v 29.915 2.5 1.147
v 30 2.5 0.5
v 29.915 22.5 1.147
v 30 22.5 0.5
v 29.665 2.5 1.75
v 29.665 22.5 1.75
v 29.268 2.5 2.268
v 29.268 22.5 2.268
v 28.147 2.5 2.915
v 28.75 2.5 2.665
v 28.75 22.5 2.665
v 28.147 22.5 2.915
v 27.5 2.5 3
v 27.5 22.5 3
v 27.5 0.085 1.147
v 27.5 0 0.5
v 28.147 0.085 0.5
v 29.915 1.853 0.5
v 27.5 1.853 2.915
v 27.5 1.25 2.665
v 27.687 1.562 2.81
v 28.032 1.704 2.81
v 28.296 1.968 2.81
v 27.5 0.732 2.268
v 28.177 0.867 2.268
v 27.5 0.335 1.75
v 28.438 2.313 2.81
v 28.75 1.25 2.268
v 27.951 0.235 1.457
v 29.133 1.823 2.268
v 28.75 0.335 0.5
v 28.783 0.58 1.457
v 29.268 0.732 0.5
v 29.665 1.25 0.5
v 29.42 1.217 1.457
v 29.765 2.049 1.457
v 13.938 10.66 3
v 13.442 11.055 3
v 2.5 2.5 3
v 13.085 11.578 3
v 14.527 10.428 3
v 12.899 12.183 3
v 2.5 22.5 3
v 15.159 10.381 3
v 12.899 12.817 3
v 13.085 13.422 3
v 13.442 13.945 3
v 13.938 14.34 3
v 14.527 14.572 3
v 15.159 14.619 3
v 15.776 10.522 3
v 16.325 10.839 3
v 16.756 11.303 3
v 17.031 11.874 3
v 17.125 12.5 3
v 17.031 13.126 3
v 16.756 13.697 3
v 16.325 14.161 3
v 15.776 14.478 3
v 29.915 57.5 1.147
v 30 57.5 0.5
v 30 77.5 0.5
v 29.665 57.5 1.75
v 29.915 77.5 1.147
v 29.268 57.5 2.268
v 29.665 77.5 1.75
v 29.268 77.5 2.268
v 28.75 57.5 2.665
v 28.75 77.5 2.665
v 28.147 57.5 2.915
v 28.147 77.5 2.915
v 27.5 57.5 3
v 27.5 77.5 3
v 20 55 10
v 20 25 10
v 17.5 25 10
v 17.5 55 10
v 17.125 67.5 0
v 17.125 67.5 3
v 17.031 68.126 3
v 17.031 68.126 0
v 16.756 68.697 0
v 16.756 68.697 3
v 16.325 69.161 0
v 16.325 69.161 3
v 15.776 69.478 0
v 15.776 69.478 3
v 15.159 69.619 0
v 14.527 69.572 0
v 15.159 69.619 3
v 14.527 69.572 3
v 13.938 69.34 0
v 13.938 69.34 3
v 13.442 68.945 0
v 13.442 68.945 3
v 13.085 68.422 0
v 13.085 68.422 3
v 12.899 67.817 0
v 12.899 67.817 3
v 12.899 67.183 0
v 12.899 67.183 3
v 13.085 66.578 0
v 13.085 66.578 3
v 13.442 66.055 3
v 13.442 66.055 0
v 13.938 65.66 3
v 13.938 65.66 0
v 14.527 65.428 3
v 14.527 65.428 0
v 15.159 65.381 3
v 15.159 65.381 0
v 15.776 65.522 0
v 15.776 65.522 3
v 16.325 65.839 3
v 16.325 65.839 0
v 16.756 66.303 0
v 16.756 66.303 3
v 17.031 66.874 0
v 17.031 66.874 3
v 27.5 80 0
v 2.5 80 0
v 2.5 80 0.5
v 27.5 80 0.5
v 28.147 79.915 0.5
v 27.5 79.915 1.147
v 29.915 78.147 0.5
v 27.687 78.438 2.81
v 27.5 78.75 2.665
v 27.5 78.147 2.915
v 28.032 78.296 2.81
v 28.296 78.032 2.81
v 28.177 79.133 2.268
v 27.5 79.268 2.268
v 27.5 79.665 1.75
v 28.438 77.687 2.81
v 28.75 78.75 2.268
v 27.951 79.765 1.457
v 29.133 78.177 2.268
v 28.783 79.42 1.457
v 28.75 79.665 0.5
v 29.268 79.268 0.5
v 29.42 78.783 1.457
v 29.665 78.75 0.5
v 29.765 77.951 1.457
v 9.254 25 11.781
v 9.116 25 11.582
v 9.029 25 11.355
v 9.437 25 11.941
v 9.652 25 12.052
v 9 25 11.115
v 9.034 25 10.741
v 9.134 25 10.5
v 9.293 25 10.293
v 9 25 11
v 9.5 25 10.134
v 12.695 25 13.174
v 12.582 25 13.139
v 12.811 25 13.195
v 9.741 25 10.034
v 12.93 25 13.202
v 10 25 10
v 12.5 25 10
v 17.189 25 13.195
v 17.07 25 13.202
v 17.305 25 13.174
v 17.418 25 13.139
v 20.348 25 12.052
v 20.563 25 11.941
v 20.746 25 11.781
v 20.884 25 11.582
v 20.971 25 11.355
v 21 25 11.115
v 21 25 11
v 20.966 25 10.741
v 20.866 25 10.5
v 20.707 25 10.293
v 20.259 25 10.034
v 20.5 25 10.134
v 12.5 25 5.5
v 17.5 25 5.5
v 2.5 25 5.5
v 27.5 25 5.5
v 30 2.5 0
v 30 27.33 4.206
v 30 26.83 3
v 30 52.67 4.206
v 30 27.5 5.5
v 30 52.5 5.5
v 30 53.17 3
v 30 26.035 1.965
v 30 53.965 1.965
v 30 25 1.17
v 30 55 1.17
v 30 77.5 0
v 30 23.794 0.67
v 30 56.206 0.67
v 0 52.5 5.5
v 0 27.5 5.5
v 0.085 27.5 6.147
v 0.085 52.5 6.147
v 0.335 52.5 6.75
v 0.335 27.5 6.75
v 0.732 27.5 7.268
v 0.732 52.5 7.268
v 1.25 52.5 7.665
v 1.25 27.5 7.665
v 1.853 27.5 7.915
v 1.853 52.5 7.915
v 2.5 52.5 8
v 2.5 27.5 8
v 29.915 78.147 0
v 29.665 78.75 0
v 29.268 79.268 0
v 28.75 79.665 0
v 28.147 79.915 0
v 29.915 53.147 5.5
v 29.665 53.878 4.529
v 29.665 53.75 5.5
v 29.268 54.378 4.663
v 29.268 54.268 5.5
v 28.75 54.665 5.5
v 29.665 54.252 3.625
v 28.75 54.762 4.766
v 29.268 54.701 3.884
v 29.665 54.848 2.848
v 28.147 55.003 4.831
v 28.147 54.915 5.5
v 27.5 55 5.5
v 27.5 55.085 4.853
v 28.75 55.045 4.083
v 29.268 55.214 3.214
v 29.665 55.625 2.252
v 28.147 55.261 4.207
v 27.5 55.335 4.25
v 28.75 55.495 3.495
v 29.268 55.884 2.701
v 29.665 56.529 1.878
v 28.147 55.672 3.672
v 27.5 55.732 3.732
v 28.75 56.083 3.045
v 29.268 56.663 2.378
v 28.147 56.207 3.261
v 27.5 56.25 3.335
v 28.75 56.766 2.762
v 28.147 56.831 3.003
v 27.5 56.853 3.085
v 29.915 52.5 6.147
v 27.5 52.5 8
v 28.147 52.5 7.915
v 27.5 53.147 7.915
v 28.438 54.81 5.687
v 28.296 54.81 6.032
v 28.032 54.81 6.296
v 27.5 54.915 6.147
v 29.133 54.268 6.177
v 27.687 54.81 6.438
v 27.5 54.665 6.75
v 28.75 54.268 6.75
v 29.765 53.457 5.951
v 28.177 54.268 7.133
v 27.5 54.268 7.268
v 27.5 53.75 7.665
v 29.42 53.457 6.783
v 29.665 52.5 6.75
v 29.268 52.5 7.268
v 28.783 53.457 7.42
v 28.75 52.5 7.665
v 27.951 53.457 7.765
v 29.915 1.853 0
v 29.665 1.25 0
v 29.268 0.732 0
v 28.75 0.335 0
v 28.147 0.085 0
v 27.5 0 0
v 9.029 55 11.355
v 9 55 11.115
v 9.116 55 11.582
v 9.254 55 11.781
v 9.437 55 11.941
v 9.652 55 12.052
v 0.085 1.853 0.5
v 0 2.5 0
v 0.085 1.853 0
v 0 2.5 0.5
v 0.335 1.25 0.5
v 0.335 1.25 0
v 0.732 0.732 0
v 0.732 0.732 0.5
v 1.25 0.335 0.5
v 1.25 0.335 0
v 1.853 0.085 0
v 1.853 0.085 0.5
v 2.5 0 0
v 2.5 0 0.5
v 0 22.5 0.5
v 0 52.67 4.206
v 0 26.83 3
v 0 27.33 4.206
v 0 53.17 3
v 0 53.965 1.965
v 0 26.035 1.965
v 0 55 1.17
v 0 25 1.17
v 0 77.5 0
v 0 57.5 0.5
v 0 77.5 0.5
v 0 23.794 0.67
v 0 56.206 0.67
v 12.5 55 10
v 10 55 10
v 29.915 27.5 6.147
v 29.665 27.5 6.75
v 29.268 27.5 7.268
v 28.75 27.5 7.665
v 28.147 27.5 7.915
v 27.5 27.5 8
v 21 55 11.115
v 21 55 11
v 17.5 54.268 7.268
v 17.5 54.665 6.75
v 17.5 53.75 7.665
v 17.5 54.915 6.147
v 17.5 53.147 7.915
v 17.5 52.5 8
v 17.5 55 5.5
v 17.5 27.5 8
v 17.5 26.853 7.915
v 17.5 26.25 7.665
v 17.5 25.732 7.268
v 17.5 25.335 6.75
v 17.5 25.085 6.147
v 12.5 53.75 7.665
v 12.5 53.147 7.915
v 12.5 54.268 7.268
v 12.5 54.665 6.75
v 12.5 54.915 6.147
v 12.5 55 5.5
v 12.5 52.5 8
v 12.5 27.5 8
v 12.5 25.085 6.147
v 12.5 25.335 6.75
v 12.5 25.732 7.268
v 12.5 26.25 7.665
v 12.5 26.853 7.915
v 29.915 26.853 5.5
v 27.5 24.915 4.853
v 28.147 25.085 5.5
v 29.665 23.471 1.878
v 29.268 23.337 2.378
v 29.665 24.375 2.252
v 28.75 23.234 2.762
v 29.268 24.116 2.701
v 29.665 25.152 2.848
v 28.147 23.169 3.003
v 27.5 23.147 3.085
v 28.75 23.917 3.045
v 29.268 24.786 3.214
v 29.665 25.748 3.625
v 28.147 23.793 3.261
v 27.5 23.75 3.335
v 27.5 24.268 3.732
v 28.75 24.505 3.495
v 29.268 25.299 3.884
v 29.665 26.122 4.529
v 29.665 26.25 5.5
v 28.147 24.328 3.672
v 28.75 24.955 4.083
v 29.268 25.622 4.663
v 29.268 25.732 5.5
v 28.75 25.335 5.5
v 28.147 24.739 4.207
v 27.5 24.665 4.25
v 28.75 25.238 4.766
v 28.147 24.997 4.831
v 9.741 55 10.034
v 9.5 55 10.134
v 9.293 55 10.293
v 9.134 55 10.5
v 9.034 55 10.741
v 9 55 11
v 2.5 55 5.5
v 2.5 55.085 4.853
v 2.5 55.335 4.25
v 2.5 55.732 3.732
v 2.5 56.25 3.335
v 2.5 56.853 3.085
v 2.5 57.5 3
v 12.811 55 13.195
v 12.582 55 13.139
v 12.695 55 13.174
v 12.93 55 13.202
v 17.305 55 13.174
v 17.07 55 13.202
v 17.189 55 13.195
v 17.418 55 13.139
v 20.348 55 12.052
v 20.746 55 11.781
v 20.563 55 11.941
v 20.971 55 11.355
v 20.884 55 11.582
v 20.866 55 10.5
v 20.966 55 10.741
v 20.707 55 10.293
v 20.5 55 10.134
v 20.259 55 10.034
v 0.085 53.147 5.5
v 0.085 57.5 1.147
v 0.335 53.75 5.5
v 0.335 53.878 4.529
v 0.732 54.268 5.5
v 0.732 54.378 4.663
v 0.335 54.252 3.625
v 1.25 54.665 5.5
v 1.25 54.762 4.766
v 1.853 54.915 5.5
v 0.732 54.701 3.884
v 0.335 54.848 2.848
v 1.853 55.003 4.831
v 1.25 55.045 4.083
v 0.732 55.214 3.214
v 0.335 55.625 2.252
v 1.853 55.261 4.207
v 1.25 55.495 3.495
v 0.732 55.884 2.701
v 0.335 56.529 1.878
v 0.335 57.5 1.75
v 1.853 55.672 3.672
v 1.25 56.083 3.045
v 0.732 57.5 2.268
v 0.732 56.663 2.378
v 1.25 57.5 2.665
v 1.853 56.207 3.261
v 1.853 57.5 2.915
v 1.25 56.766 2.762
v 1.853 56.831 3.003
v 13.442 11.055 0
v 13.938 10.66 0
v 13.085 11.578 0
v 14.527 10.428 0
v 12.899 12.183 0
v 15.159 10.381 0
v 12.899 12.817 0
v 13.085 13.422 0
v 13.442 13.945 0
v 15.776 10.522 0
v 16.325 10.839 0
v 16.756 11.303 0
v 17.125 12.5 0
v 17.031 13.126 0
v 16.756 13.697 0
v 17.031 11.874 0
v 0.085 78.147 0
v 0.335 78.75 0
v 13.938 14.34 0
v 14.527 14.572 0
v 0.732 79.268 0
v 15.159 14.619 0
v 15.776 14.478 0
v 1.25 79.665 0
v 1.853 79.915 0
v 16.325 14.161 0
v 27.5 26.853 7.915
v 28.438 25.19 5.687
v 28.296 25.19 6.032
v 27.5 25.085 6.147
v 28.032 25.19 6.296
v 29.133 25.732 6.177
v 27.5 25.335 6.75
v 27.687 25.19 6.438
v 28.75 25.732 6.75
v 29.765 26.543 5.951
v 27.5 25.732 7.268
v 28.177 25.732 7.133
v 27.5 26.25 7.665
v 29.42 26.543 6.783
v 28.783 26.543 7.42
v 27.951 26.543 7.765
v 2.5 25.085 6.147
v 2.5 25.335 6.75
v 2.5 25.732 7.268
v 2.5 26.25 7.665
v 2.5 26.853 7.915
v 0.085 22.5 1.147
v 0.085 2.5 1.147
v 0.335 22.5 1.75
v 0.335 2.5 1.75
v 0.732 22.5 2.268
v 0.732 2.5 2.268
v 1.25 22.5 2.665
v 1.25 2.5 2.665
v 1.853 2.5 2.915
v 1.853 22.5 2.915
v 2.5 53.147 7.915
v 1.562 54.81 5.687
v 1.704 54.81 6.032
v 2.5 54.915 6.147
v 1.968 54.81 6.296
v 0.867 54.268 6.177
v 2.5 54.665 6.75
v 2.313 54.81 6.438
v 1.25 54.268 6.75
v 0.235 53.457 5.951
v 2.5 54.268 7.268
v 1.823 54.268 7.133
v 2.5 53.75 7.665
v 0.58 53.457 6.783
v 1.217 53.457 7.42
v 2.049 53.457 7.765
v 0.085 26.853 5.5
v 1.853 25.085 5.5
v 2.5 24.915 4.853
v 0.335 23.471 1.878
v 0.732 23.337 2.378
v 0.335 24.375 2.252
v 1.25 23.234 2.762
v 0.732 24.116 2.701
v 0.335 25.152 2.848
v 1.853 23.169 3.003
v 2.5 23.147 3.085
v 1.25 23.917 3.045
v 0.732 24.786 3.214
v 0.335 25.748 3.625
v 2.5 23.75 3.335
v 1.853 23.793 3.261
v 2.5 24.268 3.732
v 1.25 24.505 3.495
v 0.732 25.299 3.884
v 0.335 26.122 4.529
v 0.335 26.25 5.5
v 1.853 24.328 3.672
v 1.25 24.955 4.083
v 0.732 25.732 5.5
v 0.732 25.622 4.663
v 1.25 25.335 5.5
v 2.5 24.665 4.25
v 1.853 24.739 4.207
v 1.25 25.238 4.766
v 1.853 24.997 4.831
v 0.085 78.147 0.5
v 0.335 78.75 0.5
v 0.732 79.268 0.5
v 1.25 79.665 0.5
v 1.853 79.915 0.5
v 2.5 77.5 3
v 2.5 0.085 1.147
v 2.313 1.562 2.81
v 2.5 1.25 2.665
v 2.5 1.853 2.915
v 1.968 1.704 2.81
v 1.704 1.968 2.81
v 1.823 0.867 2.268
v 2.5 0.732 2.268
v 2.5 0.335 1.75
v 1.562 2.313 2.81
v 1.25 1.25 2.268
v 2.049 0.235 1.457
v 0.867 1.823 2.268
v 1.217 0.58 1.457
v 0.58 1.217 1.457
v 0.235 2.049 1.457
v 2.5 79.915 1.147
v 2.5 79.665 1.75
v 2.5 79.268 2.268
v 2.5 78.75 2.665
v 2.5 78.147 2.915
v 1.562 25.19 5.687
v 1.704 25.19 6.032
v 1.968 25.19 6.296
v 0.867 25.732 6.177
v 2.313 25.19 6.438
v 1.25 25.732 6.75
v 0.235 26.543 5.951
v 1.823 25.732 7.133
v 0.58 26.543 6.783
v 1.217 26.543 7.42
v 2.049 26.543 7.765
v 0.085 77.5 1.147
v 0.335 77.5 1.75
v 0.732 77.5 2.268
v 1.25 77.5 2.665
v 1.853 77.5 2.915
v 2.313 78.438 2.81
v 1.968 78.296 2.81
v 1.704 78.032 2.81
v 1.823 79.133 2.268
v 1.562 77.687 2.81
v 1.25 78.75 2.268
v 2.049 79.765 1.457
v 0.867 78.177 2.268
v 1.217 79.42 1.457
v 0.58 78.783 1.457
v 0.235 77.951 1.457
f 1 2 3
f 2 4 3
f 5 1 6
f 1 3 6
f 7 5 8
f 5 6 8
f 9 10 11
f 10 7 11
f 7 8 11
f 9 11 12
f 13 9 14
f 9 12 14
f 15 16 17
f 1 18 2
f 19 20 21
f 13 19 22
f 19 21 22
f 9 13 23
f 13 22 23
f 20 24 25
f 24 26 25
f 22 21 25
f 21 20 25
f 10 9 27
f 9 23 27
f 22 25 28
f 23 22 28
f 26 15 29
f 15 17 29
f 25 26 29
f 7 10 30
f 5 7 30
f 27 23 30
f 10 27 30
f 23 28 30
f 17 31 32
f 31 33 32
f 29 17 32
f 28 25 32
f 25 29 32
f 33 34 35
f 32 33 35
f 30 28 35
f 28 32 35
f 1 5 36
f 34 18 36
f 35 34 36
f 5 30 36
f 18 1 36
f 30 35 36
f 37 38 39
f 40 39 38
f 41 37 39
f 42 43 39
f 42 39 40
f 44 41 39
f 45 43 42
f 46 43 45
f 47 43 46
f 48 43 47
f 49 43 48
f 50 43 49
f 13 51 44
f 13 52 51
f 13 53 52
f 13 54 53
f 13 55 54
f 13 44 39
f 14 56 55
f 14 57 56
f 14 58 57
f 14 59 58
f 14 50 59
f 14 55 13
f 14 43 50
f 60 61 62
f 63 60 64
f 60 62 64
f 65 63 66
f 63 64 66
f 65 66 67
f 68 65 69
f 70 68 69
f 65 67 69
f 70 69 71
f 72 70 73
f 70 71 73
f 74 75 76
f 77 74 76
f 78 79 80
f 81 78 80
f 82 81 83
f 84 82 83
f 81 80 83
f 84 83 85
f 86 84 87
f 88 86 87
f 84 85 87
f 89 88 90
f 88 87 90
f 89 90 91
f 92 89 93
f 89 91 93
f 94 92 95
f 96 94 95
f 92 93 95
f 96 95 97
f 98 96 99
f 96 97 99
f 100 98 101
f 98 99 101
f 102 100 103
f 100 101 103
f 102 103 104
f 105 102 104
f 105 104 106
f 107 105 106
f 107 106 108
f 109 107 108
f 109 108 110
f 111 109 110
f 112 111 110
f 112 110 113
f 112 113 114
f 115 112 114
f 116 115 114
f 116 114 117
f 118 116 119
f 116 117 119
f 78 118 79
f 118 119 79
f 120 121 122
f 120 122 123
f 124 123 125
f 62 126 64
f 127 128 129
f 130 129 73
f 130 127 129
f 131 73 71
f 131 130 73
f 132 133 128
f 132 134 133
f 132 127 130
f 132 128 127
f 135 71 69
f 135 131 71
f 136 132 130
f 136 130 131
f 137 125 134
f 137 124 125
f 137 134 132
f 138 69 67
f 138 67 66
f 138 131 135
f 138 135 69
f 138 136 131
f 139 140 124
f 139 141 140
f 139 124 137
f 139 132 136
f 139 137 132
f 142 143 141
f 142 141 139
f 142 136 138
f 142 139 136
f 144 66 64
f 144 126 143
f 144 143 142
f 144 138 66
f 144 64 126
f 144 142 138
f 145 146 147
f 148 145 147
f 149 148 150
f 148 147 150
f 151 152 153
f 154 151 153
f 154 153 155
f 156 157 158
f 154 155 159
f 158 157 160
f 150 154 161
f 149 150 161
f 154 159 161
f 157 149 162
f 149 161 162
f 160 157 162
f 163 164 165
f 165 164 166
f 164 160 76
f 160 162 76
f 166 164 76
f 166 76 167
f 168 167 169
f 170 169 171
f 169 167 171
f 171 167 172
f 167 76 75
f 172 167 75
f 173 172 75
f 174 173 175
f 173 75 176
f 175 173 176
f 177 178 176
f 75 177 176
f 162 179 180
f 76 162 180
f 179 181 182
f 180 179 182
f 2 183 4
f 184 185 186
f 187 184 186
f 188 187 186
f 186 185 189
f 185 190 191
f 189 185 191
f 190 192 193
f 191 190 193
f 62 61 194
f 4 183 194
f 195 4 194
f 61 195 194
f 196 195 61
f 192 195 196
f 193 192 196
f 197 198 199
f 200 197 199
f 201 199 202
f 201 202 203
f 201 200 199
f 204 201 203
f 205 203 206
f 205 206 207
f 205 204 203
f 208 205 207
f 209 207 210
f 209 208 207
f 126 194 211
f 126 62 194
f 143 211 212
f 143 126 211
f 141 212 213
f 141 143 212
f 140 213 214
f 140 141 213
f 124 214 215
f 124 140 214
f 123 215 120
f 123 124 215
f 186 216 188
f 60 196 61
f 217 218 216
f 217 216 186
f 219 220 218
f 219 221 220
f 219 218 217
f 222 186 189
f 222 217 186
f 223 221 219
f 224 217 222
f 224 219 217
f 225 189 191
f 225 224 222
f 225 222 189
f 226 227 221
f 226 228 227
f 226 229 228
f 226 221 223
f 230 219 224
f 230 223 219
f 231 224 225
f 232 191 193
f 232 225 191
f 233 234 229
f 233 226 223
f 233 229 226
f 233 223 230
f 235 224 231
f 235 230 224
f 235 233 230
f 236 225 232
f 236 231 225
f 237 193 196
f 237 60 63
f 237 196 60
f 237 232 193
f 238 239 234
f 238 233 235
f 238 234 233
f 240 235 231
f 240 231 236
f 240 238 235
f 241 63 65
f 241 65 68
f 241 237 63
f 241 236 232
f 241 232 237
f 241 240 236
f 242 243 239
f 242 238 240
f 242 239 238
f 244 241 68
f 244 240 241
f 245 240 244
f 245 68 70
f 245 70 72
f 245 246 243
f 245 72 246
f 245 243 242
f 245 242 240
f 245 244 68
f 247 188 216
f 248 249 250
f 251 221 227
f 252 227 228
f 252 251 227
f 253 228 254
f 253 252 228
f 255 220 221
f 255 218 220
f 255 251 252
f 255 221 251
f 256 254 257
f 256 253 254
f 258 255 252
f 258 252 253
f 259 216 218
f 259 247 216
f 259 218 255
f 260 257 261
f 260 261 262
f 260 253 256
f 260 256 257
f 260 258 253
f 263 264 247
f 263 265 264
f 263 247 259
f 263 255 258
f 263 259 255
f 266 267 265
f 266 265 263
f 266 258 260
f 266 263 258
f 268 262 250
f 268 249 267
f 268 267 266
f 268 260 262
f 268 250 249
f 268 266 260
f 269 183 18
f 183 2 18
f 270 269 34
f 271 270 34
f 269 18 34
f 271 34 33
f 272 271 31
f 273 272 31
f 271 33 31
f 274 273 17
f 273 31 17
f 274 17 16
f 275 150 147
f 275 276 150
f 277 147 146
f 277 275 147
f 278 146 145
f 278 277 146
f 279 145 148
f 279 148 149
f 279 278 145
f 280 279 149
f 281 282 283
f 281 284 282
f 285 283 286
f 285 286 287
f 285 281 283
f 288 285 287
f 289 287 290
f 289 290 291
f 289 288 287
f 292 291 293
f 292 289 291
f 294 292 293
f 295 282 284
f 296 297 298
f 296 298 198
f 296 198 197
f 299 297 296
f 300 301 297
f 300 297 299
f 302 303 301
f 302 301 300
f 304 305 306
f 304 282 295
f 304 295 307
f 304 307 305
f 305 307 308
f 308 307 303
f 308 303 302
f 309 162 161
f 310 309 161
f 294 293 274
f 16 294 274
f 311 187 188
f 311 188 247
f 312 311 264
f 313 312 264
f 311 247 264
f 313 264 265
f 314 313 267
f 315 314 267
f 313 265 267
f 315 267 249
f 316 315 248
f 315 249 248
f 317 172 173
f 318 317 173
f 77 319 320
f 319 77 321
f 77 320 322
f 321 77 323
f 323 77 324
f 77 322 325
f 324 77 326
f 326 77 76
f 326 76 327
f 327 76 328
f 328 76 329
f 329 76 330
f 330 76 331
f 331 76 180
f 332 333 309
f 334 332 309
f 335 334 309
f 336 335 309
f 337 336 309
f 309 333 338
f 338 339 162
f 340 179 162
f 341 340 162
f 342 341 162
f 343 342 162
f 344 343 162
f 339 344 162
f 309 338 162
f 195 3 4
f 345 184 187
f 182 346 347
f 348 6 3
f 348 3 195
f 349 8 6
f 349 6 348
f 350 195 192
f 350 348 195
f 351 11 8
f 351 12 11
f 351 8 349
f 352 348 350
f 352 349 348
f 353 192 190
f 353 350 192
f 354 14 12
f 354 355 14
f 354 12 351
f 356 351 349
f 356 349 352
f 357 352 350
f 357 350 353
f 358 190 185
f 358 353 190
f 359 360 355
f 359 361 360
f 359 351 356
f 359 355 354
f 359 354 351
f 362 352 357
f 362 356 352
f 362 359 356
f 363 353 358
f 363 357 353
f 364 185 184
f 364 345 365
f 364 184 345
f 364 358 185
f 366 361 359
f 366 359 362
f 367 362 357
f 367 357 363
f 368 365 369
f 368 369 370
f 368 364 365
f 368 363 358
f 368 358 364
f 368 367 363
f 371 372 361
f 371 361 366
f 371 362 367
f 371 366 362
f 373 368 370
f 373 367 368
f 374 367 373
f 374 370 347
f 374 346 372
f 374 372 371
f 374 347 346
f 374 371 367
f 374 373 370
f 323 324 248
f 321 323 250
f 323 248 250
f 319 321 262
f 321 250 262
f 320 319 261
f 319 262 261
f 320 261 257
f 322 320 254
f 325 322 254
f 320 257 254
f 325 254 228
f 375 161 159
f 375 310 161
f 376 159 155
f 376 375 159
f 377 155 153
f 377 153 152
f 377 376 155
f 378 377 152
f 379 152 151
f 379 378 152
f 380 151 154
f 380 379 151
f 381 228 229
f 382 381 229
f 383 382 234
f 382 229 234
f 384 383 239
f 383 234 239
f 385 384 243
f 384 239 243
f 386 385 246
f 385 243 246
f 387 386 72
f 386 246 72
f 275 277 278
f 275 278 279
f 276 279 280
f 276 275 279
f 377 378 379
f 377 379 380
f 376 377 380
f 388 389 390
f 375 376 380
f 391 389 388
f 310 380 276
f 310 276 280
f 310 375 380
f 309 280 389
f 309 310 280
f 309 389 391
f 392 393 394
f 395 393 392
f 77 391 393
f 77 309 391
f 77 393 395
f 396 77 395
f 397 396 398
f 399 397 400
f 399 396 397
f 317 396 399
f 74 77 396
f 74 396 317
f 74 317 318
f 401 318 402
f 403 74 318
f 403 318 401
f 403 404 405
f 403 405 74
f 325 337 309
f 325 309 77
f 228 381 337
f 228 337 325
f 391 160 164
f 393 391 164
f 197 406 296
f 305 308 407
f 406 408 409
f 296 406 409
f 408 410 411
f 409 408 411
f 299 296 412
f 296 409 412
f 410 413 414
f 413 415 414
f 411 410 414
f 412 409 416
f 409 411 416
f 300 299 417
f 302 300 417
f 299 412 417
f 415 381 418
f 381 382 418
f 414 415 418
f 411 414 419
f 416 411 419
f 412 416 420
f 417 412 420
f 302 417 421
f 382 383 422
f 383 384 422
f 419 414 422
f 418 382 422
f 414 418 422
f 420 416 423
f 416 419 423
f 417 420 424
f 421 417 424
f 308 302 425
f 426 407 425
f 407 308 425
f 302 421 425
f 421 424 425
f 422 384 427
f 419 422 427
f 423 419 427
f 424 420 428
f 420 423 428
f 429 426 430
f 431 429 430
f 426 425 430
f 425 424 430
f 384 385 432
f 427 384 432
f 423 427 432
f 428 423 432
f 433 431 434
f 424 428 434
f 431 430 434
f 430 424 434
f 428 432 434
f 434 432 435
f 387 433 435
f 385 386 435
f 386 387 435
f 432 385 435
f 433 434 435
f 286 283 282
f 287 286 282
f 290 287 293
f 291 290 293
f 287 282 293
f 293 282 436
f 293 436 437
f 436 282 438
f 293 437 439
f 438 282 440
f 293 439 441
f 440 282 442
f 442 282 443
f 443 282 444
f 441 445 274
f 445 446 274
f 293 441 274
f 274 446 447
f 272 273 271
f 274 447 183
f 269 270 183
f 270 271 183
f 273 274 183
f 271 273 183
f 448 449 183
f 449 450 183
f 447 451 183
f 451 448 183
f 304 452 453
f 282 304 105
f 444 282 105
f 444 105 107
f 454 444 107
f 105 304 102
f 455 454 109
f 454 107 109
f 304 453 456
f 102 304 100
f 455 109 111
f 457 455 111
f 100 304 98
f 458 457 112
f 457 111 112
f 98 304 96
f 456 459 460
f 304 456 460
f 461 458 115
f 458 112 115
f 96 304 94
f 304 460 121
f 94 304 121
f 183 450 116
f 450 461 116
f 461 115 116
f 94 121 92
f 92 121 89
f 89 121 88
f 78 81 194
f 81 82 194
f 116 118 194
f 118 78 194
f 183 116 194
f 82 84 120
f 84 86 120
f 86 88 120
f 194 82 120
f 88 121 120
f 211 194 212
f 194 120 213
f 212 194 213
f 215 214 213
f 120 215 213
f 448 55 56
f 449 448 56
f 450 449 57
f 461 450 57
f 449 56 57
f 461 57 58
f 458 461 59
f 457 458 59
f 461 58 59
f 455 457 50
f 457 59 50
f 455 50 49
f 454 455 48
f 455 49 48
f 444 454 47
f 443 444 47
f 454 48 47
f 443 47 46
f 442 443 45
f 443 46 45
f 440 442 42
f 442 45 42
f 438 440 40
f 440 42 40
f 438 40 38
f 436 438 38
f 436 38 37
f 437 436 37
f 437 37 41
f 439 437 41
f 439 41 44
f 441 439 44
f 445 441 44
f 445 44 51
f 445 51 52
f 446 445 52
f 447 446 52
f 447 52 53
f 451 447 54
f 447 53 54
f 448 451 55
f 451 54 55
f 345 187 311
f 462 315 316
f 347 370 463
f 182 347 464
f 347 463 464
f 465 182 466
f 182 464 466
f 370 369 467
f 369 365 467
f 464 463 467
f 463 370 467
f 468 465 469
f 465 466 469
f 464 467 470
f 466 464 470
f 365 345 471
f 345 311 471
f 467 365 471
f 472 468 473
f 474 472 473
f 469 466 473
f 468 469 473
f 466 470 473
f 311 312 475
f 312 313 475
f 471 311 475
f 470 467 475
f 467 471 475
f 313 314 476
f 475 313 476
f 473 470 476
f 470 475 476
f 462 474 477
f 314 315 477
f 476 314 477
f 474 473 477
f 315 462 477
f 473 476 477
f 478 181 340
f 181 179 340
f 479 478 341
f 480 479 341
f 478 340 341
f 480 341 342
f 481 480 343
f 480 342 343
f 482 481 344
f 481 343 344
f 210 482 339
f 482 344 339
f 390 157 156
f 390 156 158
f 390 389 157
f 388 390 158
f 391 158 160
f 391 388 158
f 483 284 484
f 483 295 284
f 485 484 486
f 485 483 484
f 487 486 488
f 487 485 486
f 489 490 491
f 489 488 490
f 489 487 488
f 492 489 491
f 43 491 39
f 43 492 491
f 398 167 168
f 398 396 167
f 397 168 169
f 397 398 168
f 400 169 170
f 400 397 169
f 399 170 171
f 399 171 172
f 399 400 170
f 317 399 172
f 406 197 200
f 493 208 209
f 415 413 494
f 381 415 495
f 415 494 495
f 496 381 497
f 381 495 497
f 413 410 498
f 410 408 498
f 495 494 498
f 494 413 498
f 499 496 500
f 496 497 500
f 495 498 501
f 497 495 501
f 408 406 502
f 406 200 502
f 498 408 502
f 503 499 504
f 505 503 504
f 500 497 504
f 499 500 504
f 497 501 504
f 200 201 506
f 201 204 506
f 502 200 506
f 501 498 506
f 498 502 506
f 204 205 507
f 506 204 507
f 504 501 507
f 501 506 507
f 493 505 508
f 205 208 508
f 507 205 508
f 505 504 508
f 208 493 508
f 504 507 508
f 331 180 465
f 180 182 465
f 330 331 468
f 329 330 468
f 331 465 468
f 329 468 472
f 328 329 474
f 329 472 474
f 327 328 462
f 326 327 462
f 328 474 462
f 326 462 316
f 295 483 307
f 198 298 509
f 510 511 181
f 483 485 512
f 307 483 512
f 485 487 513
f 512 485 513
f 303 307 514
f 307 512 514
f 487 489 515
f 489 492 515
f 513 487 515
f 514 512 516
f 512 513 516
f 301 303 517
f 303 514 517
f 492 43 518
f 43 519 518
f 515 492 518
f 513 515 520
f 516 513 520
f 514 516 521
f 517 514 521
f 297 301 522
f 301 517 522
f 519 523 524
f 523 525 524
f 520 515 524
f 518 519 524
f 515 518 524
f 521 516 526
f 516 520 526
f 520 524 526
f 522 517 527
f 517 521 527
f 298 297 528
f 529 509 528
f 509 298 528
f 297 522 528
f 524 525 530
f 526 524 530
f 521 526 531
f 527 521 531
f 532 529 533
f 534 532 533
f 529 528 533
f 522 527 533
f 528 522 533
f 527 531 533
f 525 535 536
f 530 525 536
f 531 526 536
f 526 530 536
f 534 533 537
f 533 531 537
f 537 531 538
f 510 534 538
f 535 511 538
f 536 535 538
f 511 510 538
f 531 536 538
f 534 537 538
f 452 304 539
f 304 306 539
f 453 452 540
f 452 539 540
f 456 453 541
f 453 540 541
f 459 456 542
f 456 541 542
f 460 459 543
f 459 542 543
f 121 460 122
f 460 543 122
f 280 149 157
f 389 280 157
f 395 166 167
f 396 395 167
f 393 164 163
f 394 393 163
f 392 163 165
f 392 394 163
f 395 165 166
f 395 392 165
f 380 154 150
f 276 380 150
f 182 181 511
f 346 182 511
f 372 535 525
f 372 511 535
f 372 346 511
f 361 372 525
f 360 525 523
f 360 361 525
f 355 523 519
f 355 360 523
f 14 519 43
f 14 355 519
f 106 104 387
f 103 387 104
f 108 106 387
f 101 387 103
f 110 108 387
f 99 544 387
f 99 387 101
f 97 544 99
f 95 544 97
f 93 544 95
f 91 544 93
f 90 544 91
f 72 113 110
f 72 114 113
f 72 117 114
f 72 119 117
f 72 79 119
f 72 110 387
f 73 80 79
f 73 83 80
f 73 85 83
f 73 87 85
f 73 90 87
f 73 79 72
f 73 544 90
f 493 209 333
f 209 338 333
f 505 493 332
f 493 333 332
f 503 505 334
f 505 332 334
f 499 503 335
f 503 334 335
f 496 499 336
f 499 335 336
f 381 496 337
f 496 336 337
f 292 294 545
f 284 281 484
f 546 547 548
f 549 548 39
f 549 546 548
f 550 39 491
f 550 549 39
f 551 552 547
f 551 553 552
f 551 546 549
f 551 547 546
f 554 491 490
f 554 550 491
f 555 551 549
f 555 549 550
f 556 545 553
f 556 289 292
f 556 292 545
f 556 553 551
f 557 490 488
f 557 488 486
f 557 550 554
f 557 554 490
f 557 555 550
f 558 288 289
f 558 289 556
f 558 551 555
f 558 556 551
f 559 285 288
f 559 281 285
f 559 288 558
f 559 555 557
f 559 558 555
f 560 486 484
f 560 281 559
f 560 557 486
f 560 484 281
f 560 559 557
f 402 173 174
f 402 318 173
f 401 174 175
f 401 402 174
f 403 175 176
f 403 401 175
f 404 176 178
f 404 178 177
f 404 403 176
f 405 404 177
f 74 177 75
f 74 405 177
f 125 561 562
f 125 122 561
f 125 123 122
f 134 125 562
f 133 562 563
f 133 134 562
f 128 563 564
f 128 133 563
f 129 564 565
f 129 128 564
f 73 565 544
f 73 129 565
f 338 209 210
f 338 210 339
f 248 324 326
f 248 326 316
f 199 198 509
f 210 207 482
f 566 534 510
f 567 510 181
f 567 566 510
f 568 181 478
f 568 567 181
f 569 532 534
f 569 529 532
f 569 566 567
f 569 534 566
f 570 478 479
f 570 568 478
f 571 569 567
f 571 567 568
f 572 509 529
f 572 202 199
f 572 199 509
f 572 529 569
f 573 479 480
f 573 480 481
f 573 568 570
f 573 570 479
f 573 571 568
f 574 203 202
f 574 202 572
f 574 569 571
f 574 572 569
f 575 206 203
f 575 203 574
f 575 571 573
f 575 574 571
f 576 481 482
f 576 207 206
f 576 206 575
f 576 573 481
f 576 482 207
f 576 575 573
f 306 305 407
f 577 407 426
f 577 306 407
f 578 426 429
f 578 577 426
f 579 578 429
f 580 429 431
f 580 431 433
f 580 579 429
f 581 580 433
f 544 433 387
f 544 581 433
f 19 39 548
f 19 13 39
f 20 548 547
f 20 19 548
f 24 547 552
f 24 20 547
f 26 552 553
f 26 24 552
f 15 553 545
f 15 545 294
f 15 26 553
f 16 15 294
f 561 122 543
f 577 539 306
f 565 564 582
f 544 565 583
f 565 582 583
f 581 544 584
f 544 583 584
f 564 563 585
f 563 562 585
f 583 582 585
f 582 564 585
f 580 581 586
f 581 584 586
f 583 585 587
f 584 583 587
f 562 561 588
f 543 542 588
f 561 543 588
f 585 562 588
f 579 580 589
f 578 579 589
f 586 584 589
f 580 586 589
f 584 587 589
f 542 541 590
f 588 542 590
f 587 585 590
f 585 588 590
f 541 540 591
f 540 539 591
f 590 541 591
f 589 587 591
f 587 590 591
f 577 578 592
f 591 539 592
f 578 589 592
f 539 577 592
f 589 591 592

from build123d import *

# Parameters (mm, degrees)
ESQUISSE1_W             = 30
ESQUISSE1_H             = 80
BOSS_EXTRU_1_DEPTH      = 3
ESQUISSE2_R             = 2.125
ENL_V_MAT_EXTRU_1_DEPTH = 3
ESQUISSE3_W             = 30
ESQUISSE3_H             = 30
BOSS_EXTRU_2_DEPTH      = 5
BOSS_EXTRU_3_DEPTH      = 30
CONG_1_R                = 1
CONG_2_R                = 2.5


with BuildPart() as part:
    # Esquisse1 → Boss.-Extru.1 (new body)
    with BuildSketch(Plane.XY):
        with Locations((15, 40)):
            Rectangle(ESQUISSE1_W, ESQUISSE1_H)
    extrude(amount=BOSS_EXTRU_1_DEPTH)

    # Esquisse2 → Enlèv. mat.-Extru.1 (cut)
    with BuildSketch(Plane.XY.offset(3)):
        with Locations((15, 67.5)):
            Circle(ESQUISSE2_R)
        with Locations((15, 12.5)):
            Circle(ESQUISSE2_R)
    extrude(amount=-ENL_V_MAT_EXTRU_1_DEPTH, mode=Mode.SUBTRACT)

    # Esquisse3 → Boss.-Extru.2 (add)
    with BuildSketch(Plane.XY.offset(3)):
        with Locations((15, 40)):
            Rectangle(ESQUISSE3_W, ESQUISSE3_H)
    extrude(amount=BOSS_EXTRU_2_DEPTH)

    # Esquisse4 → Boss.-Extru.3 (add)
    with BuildSketch(Plane(origin=(0, 25, 0), x_dir=(-1, 0, 0), z_dir=(0, -1, 0))):
        Polygon((-12.5, -8), (-12.5, -10), (-9, -10), (-9, -11.81), (-12.75, -13.201941091), (-17.25, -13.201941091), (-21, -11.81), (-21, -10), (-17.5, -10), (-17.5, -8), align=None)
    extrude(amount=-BOSS_EXTRU_3_DEPTH)

    # Congé1
    cong_1_edges = [part.edges().sort_by_distance(p)[0] for p in [
        (9, 40, 10),
        (9, 40, 11.81),
        (12.75, 40, 13.201941091),
        (17.25, 40, 13.201941091),
        (21, 40, 11.81),
        (21, 40, 10),
    ]]
    fillet(cong_1_edges, radius=CONG_1_R)

    # Congé2
    cong_2_edges = [part.edges().sort_by_distance(p)[0] for p in [
        (15, 55, 3),
        (15, 25, 3),
    ]]
    fillet(cong_2_edges, radius=CONG_2_R)
    cong_2_2_edges = [part.edges().sort_by_distance(p)[0] for p in [
        (0, 0, 1.5),
        (30, 40, 8),
        (0, 40, 8),
        (30, 80, 1.5),
        (0, 80, 1.5),
        (15, 80, 3),
        (30, 68.75, 3),
        (0, 68.75, 3),
        (30, 0, 1.5),
        (15, 0, 3),
        (0, 11.25, 3),
        (30, 11.25, 3),
        (23.75, 25, 8),
        (6.25, 25, 8),
        (23.75, 55, 8),
        (6.25, 55, 8),
        (30, 24.267766953, 3.732233047),
        (0, 24.267766953, 3.732233047),
        (0, 55.732233047, 3.732233047),
        (30, 55.732233047, 3.732233047),
    ]]
    fillet(cong_2_2_edges, radius=CONG_2_R - 0.0001)  # a hair under: the kernel refuses the full size


solid = part.part
